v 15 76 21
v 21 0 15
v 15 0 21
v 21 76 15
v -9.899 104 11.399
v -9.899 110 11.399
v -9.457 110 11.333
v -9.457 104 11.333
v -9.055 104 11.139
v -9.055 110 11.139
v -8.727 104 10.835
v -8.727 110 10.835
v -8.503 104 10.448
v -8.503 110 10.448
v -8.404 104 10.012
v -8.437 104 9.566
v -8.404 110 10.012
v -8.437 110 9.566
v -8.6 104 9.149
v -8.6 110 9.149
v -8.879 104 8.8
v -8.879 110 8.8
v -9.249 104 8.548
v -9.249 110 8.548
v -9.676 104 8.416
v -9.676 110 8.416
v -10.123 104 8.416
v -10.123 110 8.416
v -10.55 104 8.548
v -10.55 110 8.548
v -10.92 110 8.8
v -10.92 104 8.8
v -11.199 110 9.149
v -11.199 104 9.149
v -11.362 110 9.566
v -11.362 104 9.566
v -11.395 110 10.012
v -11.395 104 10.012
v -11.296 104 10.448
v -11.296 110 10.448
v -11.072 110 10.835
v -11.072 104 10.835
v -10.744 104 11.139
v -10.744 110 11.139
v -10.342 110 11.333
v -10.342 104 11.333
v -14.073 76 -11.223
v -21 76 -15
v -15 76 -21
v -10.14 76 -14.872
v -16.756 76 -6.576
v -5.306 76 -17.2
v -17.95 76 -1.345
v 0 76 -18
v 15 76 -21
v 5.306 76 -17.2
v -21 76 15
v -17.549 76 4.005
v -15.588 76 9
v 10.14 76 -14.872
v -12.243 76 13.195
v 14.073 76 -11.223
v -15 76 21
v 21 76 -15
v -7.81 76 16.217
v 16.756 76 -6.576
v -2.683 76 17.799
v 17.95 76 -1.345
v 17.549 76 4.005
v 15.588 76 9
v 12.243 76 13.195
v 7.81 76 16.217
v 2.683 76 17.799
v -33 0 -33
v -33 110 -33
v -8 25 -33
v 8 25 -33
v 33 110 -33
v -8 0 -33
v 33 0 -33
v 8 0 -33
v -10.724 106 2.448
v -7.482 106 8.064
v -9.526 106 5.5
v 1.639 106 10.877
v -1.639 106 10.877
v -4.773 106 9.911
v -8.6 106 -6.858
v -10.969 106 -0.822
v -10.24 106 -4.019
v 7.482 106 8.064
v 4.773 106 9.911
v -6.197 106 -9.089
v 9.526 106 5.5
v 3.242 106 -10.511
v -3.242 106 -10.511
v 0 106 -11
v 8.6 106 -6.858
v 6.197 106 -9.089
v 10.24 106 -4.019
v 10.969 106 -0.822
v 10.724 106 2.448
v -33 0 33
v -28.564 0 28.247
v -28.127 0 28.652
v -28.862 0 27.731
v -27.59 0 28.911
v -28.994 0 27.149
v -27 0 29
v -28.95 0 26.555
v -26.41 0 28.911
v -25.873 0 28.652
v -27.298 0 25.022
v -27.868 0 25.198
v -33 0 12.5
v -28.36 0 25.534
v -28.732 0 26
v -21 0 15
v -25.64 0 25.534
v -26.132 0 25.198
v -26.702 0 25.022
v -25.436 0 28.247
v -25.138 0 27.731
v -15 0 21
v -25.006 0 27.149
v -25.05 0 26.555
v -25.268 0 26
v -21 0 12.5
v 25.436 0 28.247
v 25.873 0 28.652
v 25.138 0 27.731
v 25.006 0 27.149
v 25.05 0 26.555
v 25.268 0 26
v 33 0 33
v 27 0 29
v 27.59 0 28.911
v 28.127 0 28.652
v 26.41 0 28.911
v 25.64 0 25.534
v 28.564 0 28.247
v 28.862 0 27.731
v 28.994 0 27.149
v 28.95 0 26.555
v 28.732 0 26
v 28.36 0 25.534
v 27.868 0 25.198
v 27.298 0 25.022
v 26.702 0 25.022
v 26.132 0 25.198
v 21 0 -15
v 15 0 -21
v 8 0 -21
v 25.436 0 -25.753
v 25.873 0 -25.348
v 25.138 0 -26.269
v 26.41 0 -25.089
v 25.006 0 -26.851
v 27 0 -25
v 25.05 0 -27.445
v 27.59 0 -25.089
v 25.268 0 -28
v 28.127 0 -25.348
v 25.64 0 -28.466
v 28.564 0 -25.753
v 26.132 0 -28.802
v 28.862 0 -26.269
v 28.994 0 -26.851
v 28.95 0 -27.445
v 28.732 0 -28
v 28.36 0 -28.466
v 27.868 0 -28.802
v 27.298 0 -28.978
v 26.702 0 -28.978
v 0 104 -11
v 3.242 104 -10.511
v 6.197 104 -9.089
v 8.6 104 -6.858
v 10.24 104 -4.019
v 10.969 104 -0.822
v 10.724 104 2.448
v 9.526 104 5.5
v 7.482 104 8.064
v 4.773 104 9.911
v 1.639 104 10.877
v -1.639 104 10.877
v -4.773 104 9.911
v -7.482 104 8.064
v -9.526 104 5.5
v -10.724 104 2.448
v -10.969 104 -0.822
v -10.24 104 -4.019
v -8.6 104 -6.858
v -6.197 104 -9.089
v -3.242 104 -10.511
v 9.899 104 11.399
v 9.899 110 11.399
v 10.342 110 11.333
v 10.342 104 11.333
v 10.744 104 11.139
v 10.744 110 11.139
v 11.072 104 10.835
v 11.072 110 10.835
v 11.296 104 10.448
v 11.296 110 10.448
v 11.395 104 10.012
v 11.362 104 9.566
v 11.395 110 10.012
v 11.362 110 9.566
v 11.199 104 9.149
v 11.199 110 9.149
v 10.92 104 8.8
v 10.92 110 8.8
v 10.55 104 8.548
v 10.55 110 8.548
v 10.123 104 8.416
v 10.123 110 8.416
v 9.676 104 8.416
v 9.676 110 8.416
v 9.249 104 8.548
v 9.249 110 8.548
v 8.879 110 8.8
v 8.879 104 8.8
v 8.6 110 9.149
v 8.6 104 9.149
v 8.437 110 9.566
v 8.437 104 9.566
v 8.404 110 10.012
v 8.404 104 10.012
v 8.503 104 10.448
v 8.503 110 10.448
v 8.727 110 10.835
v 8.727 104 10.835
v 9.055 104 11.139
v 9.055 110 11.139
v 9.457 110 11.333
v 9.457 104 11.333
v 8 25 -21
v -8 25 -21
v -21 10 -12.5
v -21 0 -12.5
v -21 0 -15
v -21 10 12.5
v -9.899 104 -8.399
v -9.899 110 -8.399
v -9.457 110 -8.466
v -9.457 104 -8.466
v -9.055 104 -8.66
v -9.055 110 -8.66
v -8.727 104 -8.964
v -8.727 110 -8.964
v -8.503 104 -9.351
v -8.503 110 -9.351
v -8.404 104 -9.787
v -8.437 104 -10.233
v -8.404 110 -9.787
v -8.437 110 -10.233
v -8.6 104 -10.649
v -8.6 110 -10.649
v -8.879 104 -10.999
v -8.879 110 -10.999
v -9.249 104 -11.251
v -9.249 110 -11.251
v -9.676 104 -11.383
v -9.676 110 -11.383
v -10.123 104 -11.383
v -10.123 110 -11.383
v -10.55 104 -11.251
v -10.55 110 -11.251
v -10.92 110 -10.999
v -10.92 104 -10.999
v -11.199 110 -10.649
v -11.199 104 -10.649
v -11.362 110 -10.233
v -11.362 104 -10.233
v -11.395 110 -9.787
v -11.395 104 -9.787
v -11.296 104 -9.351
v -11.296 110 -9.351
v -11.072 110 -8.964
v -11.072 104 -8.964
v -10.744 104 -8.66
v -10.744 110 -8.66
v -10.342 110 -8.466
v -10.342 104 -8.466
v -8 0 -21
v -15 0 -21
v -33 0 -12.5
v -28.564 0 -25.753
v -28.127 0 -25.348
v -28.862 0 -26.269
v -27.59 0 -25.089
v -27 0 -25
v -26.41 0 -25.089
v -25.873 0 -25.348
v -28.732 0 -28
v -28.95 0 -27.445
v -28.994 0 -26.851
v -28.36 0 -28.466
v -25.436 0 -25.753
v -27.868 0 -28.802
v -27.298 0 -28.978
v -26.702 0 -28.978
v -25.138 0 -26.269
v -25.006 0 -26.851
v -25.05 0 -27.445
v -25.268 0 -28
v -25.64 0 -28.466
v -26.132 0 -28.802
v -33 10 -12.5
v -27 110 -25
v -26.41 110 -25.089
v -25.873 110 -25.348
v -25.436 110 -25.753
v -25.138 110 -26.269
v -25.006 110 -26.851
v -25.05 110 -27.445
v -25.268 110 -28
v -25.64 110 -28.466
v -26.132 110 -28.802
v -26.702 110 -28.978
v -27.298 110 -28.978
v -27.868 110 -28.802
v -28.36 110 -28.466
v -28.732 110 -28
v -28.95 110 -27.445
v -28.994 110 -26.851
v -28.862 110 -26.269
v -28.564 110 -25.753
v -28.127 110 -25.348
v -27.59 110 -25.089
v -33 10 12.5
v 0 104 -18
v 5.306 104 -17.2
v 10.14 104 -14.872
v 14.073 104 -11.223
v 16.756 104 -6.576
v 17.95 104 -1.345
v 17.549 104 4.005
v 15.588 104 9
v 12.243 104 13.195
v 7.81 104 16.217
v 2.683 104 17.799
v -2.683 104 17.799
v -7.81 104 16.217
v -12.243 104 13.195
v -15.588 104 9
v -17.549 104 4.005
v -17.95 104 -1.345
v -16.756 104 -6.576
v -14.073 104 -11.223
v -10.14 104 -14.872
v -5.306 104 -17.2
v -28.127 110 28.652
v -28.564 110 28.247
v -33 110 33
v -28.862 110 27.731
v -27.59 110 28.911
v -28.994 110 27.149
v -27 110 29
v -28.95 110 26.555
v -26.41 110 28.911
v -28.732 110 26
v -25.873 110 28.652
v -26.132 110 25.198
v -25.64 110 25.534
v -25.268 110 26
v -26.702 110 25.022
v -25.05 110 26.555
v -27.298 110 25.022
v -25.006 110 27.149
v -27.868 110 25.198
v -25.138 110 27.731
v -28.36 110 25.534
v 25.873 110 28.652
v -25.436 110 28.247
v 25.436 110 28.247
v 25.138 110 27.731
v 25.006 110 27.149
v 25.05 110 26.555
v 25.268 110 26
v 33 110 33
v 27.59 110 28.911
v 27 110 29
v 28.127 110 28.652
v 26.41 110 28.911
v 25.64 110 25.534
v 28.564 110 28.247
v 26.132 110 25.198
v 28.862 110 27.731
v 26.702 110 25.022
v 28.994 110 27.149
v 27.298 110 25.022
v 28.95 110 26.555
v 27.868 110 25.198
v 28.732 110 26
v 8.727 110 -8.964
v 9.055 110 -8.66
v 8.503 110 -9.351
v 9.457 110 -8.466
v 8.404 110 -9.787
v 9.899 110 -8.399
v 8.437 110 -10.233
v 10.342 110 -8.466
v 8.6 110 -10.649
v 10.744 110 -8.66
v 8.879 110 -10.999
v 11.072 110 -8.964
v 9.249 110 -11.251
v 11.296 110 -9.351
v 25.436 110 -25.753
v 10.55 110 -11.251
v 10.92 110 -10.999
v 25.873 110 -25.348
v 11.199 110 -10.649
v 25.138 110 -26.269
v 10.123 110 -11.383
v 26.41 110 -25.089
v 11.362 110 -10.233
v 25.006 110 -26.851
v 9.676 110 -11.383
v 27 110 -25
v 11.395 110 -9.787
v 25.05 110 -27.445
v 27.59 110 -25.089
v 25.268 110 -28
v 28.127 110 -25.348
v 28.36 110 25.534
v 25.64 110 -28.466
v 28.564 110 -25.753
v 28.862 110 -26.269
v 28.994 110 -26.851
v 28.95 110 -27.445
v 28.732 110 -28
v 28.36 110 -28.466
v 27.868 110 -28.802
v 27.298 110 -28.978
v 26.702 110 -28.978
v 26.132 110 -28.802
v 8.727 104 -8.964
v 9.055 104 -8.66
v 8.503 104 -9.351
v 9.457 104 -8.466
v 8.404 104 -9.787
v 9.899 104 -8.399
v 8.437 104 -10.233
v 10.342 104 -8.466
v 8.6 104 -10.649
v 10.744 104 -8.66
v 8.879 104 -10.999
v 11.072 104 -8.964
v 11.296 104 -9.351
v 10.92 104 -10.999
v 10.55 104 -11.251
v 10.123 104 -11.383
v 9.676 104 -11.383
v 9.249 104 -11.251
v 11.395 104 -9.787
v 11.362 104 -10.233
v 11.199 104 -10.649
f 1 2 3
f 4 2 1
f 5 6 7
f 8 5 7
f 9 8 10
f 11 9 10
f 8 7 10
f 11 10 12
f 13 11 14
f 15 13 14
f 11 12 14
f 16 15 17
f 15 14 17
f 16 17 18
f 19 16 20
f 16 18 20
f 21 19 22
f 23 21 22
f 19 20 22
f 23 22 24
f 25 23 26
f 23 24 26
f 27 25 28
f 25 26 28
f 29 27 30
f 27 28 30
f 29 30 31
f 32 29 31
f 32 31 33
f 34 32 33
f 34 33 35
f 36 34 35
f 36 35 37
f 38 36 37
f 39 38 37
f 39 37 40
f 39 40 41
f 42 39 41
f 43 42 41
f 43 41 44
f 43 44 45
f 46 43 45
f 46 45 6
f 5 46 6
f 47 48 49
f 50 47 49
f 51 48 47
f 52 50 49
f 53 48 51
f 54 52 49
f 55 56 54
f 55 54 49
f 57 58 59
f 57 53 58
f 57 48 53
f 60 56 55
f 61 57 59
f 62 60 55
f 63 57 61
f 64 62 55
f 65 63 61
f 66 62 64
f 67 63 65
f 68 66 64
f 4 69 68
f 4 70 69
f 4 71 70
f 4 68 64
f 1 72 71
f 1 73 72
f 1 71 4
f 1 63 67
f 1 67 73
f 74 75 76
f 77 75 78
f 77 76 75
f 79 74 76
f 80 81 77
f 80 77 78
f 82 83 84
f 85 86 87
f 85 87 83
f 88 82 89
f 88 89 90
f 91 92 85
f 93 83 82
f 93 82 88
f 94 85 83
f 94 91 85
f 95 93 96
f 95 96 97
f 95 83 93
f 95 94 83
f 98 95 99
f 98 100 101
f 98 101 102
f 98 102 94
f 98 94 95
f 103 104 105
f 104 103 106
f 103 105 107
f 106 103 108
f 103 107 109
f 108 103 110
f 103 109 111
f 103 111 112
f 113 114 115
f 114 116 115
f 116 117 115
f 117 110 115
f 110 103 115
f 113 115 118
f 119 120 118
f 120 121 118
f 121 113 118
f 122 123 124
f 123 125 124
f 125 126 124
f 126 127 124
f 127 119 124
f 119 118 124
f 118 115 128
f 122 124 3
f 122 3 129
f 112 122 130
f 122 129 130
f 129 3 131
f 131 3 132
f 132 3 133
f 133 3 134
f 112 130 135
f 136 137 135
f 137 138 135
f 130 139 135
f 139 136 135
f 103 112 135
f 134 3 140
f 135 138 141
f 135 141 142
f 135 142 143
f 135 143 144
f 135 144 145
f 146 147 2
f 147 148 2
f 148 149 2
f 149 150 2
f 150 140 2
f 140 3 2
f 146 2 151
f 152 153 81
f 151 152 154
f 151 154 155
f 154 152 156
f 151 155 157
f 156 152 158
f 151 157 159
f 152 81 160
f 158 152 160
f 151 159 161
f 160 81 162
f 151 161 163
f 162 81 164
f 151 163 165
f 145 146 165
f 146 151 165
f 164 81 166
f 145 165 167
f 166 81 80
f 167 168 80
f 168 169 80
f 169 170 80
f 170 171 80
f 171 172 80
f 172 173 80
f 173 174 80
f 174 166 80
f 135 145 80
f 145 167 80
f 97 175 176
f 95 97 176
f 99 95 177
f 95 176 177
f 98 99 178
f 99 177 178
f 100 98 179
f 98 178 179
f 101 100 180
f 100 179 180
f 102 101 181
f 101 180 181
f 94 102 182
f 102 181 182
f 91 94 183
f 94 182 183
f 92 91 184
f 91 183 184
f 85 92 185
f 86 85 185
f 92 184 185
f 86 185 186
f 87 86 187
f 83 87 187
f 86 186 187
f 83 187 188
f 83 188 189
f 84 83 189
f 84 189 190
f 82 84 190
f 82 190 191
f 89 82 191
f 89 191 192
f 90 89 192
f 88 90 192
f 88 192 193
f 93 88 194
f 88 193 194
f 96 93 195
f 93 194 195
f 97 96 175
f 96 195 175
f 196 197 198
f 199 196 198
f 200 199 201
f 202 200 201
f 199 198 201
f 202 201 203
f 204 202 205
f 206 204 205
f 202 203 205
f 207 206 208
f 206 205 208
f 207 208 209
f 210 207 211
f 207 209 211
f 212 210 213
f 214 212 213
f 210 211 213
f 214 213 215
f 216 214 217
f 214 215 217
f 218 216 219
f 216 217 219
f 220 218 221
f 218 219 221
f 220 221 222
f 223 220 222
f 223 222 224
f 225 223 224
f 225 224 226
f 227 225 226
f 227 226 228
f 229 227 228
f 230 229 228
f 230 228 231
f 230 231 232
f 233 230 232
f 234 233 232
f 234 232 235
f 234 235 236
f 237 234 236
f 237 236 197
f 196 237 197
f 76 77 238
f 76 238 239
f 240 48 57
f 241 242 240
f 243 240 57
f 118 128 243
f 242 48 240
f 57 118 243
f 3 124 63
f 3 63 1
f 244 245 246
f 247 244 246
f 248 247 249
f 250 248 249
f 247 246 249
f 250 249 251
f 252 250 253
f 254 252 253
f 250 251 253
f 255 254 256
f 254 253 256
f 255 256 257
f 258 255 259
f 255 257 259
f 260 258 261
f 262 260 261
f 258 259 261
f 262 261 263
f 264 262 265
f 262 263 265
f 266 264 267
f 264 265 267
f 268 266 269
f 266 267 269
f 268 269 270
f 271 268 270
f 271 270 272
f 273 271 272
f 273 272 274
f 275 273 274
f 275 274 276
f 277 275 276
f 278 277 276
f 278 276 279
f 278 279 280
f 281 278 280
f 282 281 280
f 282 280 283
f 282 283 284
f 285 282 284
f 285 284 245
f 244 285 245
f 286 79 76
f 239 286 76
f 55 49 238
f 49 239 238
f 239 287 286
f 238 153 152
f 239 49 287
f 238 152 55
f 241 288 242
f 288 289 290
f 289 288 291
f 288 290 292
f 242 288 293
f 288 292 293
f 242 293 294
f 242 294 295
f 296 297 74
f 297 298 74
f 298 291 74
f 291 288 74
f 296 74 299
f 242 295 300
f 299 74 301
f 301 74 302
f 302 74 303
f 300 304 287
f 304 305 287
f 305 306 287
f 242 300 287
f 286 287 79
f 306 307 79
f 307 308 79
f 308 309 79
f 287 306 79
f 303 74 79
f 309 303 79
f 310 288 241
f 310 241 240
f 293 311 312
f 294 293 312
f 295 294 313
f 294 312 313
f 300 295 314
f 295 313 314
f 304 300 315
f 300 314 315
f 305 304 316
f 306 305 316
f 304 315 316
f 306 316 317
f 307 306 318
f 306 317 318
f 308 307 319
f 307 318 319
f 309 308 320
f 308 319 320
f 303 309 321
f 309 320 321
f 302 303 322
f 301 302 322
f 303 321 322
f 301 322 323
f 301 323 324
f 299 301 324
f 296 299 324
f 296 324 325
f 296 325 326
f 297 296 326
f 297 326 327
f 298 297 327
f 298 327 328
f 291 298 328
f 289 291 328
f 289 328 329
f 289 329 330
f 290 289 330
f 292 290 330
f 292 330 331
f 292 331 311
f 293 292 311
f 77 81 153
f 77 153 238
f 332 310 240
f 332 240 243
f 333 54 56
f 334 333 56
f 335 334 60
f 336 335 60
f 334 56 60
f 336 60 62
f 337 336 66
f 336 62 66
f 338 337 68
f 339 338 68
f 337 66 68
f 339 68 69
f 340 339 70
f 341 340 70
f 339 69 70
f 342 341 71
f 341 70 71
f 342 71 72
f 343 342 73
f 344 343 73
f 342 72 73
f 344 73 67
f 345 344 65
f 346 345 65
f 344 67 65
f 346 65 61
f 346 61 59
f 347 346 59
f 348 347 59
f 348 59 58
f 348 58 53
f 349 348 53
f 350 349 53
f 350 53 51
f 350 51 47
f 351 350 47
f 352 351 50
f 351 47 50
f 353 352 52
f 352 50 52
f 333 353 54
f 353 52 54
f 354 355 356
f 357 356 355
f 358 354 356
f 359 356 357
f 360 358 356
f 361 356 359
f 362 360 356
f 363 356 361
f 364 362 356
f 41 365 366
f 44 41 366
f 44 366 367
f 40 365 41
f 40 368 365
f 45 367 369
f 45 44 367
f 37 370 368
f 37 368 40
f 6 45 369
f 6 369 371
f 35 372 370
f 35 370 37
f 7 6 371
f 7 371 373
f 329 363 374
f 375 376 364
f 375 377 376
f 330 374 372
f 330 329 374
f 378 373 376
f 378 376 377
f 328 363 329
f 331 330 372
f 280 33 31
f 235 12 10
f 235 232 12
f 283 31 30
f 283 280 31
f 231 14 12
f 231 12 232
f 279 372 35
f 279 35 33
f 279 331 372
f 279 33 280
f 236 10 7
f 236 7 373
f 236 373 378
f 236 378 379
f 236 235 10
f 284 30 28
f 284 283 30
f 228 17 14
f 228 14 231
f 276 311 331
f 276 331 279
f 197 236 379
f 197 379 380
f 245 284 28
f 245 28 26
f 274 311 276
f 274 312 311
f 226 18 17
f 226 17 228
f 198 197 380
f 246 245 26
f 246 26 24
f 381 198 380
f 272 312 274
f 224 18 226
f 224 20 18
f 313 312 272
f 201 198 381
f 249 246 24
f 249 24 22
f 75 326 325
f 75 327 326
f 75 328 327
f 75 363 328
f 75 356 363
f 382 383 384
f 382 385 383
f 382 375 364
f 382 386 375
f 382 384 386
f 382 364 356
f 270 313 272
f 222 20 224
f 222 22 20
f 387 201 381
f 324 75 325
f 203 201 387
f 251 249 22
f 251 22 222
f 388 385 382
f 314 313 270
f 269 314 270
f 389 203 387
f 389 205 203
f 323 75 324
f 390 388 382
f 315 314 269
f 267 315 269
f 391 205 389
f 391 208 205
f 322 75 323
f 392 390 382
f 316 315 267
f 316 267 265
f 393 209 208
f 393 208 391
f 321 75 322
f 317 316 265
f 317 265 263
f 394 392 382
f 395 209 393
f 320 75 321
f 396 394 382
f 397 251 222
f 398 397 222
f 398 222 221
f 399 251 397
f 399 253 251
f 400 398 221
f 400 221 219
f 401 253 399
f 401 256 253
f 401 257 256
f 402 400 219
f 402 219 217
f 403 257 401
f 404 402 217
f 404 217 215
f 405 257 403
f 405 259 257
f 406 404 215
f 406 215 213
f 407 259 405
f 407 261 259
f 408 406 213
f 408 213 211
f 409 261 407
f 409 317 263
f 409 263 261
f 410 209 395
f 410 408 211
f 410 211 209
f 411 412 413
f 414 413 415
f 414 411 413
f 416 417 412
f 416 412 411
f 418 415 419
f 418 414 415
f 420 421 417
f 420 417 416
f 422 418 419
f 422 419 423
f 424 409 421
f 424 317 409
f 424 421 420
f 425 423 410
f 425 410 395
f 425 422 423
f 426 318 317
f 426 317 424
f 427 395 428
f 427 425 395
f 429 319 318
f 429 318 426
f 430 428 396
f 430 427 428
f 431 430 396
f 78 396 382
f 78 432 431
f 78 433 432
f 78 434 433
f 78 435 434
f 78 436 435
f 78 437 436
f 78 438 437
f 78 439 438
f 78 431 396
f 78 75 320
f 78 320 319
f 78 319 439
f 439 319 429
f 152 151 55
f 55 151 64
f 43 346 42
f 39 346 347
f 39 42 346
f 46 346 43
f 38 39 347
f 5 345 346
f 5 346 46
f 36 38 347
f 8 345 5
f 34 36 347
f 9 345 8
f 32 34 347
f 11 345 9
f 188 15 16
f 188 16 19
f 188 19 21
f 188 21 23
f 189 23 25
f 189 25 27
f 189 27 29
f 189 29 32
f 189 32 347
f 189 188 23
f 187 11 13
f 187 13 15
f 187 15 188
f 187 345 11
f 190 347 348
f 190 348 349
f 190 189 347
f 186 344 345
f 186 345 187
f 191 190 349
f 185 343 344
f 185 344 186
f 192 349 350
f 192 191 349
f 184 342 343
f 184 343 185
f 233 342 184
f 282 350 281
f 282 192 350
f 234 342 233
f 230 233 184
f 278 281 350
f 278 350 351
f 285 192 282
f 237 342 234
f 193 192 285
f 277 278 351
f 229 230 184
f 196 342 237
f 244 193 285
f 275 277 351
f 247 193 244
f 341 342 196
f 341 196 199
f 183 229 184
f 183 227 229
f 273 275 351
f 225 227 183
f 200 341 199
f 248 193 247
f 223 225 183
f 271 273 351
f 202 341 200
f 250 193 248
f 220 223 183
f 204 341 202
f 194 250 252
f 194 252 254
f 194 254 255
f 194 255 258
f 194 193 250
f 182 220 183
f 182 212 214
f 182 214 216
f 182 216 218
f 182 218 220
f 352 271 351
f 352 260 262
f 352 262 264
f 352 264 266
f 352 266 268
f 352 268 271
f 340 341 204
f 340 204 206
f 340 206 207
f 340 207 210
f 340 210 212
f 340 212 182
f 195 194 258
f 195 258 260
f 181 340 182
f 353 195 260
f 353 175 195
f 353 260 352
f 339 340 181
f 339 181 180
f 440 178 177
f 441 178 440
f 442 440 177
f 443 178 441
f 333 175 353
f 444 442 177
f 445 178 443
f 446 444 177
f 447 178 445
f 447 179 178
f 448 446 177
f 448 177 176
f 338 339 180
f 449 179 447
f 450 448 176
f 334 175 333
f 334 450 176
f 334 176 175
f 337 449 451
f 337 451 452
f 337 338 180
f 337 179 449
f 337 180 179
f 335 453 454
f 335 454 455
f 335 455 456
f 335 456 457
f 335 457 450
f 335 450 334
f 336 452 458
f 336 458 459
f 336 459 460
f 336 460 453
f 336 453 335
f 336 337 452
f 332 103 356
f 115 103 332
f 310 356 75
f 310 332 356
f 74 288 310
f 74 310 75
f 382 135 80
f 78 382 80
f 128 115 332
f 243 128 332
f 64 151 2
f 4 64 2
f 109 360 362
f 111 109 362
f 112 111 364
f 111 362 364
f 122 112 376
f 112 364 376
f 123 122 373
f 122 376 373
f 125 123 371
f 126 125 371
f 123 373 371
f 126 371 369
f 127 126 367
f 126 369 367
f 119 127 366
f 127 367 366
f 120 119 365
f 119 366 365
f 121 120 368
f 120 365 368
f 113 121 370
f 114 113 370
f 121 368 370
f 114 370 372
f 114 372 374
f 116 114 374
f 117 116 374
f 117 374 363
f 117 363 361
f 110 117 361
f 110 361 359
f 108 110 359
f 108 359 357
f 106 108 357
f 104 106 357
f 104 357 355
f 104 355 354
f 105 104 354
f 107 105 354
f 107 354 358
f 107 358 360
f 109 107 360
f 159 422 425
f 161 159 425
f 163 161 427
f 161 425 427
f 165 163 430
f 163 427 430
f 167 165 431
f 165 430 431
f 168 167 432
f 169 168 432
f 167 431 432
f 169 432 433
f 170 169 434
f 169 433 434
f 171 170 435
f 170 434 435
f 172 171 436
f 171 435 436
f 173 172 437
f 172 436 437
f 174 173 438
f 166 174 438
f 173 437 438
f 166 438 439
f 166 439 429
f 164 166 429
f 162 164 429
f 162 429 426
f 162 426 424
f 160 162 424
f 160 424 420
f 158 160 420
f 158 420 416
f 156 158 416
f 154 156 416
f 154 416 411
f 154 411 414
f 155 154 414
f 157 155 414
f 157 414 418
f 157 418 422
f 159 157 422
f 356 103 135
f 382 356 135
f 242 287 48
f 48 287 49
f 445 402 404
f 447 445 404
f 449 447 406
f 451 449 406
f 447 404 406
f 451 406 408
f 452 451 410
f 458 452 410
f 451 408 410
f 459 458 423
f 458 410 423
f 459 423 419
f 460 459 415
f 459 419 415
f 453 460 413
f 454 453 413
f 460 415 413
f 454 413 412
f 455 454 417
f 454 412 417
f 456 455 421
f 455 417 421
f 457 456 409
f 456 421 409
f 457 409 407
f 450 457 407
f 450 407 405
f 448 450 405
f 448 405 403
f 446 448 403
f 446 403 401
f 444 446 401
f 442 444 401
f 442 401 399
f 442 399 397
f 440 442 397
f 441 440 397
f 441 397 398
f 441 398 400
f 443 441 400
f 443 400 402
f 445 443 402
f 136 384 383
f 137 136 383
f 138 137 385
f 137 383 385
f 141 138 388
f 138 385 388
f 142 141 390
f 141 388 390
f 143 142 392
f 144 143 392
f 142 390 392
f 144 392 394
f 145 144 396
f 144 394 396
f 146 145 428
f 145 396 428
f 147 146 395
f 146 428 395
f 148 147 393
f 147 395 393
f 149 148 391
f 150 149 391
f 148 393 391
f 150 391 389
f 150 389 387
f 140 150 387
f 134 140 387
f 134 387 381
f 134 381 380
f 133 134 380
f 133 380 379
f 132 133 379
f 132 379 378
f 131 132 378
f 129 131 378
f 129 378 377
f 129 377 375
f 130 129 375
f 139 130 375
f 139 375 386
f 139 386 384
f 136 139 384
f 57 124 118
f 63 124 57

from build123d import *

# Parameters (mm, degrees)
SKETCH_1_W          = 66
SKETCH_1_H          = 66
SKETCH_1_W_2        = 42
SKETCH_1_H_2        = 42
EXTRUDE_1_DEPTH     = 110
SKETCH_2_W          = 42
SKETCH_2_H          = 42
CUT_EXTRUDE_1_DEPTH = 76
SKETCH_3_R          = 18
CUT_EXTRUDE_2_DEPTH = 28
SKETCH_4_R          = 11
CUT_EXTRUDE_3_DEPTH = 2
SKETCH_5_R          = 1.5
SKETCH_5_R_2        = 2
CUT_EXTRUDE_4_DEPTH = 120.490585403
CHAMFER_1_SIZE      = 6
CUT_EXTRUDE_5_REACH = 134.458
SKETCH_6_W          = 16
SKETCH_6_H          = 25
CUT_EXTRUDE_6_REACH = 134.458
SKETCH_7_W          = 25
SKETCH_7_H          = 10


with BuildPart() as part:
    # 草图1 → 凸台-拉伸1 (new body)
    # profile 1 of 2: a face of its own
    with BuildSketch(Plane(origin=(0, 0, 0), x_dir=(1, 0, 0), z_dir=(0, 1, 0))):
        Rectangle(SKETCH_1_W, SKETCH_1_H)
        Rectangle(SKETCH_1_W_2, SKETCH_1_H_2, mode=Mode.SUBTRACT)
    # profile 2 of 2: a face of its own
    with BuildSketch(Plane(origin=(0, 0, 0), x_dir=(1, 0, 0), z_dir=(0, 1, 0))):
        Rectangle(SKETCH_1_W_2, SKETCH_1_H_2)
    extrude(amount=EXTRUDE_1_DEPTH)

    # 草图2 → 切除-拉伸1 (cut)
    with BuildSketch(Plane.XZ):
        Rectangle(SKETCH_2_W, SKETCH_2_H)
    extrude(amount=-CUT_EXTRUDE_1_DEPTH, mode=Mode.SUBTRACT)

    # 草图3 → 切除-拉伸2 (cut)
    with BuildSketch(Plane.XZ.offset(-76)):
        with Locations(Location((0, 0, 0), (0, 0, 270))):
            Circle(SKETCH_3_R)
    extrude(amount=-CUT_EXTRUDE_2_DEPTH, mode=Mode.SUBTRACT)

    # 草图4 → 切除-拉伸3 (cut)
    with BuildSketch(Plane.XZ.offset(-104)):
        with Locations(Location((0, 0, 0), (0, 0, 270))):
            Circle(SKETCH_4_R)
    extrude(amount=-CUT_EXTRUDE_3_DEPTH, mode=Mode.SUBTRACT)

    # 草图5 → 切除-拉伸4 (cut, through all)
    with BuildSketch(Plane(origin=(0, 110, 0), x_dir=(1, 0, 0), z_dir=(0, 1, 0))):
        with Locations(Location((-9.899494937, 9.899494937, 0), (0, 0, 270))):
            Circle(SKETCH_5_R)
        with Locations(Location((9.899494937, 9.899494937, 0), (0, 0, 270))):
            Circle(SKETCH_5_R)
        with Locations(Location((9.899494937, -9.899494937, 0), (0, 0, 270))):
            Circle(SKETCH_5_R)
        with Locations(Location((-9.899494937, -9.899494937, 0), (0, 0, 270))):
            Circle(SKETCH_5_R)
        with Locations(Location((-27, 27, 0), (0, 0, 270))):
            Circle(SKETCH_5_R_2)
        with Locations(Location((27, 27, 0), (0, 0, 270))):
            Circle(SKETCH_5_R_2)
        with Locations(Location((-27, -27, 0), (0, 0, 270))):
            Circle(SKETCH_5_R_2)
        with Locations(Location((27, -27, 0), (0, 0, 270))):
            Circle(SKETCH_5_R_2)
    extrude(amount=-CUT_EXTRUDE_4_DEPTH, mode=Mode.SUBTRACT)

    # 倒角1
    chamfer_1_edges = [part.edges().sort_by_distance(p)[0] for p in [
        (21, 38, -21),
        (-21, 38, -21),
        (-21, 38, 21),
        (21, 38, 21),
    ]]
    chamfer(chamfer_1_edges, length=CHAMFER_1_SIZE)

    # 草图6 → 切除-拉伸5 (cut, up to next)
    with BuildSketch(Plane(origin=(0, 0, -33), x_dir=(-1, 0, 0), z_dir=(0, 0, -1)), mode=Mode.PRIVATE) as cut_extrude_5_sk1:
        with Locations((0, 12.5)):
            Rectangle(SKETCH_6_W, SKETCH_6_H)
    cut_extrude_5_tool1 = extrude(cut_extrude_5_sk1.sketch, amount=-CUT_EXTRUDE_5_REACH, mode=Mode.PRIVATE) & part.part
    add(cut_extrude_5_tool1.solids().sort_by_distance((0, 12.5, -33))[0], mode=Mode.SUBTRACT)

    # 草图7 → 切除-拉伸6 (cut, up to next)
    with BuildSketch(Plane.ZY.offset(33), mode=Mode.PRIVATE) as cut_extrude_6_sk1:
        with Locations((0, 5)):
            Rectangle(SKETCH_7_W, SKETCH_7_H)
    cut_extrude_6_tool1 = extrude(cut_extrude_6_sk1.sketch, amount=-CUT_EXTRUDE_6_REACH, mode=Mode.PRIVATE) & part.part
    add(cut_extrude_6_tool1.solids().sort_by_distance((-33, 5, 0))[0], mode=Mode.SUBTRACT)


solid = part.part
